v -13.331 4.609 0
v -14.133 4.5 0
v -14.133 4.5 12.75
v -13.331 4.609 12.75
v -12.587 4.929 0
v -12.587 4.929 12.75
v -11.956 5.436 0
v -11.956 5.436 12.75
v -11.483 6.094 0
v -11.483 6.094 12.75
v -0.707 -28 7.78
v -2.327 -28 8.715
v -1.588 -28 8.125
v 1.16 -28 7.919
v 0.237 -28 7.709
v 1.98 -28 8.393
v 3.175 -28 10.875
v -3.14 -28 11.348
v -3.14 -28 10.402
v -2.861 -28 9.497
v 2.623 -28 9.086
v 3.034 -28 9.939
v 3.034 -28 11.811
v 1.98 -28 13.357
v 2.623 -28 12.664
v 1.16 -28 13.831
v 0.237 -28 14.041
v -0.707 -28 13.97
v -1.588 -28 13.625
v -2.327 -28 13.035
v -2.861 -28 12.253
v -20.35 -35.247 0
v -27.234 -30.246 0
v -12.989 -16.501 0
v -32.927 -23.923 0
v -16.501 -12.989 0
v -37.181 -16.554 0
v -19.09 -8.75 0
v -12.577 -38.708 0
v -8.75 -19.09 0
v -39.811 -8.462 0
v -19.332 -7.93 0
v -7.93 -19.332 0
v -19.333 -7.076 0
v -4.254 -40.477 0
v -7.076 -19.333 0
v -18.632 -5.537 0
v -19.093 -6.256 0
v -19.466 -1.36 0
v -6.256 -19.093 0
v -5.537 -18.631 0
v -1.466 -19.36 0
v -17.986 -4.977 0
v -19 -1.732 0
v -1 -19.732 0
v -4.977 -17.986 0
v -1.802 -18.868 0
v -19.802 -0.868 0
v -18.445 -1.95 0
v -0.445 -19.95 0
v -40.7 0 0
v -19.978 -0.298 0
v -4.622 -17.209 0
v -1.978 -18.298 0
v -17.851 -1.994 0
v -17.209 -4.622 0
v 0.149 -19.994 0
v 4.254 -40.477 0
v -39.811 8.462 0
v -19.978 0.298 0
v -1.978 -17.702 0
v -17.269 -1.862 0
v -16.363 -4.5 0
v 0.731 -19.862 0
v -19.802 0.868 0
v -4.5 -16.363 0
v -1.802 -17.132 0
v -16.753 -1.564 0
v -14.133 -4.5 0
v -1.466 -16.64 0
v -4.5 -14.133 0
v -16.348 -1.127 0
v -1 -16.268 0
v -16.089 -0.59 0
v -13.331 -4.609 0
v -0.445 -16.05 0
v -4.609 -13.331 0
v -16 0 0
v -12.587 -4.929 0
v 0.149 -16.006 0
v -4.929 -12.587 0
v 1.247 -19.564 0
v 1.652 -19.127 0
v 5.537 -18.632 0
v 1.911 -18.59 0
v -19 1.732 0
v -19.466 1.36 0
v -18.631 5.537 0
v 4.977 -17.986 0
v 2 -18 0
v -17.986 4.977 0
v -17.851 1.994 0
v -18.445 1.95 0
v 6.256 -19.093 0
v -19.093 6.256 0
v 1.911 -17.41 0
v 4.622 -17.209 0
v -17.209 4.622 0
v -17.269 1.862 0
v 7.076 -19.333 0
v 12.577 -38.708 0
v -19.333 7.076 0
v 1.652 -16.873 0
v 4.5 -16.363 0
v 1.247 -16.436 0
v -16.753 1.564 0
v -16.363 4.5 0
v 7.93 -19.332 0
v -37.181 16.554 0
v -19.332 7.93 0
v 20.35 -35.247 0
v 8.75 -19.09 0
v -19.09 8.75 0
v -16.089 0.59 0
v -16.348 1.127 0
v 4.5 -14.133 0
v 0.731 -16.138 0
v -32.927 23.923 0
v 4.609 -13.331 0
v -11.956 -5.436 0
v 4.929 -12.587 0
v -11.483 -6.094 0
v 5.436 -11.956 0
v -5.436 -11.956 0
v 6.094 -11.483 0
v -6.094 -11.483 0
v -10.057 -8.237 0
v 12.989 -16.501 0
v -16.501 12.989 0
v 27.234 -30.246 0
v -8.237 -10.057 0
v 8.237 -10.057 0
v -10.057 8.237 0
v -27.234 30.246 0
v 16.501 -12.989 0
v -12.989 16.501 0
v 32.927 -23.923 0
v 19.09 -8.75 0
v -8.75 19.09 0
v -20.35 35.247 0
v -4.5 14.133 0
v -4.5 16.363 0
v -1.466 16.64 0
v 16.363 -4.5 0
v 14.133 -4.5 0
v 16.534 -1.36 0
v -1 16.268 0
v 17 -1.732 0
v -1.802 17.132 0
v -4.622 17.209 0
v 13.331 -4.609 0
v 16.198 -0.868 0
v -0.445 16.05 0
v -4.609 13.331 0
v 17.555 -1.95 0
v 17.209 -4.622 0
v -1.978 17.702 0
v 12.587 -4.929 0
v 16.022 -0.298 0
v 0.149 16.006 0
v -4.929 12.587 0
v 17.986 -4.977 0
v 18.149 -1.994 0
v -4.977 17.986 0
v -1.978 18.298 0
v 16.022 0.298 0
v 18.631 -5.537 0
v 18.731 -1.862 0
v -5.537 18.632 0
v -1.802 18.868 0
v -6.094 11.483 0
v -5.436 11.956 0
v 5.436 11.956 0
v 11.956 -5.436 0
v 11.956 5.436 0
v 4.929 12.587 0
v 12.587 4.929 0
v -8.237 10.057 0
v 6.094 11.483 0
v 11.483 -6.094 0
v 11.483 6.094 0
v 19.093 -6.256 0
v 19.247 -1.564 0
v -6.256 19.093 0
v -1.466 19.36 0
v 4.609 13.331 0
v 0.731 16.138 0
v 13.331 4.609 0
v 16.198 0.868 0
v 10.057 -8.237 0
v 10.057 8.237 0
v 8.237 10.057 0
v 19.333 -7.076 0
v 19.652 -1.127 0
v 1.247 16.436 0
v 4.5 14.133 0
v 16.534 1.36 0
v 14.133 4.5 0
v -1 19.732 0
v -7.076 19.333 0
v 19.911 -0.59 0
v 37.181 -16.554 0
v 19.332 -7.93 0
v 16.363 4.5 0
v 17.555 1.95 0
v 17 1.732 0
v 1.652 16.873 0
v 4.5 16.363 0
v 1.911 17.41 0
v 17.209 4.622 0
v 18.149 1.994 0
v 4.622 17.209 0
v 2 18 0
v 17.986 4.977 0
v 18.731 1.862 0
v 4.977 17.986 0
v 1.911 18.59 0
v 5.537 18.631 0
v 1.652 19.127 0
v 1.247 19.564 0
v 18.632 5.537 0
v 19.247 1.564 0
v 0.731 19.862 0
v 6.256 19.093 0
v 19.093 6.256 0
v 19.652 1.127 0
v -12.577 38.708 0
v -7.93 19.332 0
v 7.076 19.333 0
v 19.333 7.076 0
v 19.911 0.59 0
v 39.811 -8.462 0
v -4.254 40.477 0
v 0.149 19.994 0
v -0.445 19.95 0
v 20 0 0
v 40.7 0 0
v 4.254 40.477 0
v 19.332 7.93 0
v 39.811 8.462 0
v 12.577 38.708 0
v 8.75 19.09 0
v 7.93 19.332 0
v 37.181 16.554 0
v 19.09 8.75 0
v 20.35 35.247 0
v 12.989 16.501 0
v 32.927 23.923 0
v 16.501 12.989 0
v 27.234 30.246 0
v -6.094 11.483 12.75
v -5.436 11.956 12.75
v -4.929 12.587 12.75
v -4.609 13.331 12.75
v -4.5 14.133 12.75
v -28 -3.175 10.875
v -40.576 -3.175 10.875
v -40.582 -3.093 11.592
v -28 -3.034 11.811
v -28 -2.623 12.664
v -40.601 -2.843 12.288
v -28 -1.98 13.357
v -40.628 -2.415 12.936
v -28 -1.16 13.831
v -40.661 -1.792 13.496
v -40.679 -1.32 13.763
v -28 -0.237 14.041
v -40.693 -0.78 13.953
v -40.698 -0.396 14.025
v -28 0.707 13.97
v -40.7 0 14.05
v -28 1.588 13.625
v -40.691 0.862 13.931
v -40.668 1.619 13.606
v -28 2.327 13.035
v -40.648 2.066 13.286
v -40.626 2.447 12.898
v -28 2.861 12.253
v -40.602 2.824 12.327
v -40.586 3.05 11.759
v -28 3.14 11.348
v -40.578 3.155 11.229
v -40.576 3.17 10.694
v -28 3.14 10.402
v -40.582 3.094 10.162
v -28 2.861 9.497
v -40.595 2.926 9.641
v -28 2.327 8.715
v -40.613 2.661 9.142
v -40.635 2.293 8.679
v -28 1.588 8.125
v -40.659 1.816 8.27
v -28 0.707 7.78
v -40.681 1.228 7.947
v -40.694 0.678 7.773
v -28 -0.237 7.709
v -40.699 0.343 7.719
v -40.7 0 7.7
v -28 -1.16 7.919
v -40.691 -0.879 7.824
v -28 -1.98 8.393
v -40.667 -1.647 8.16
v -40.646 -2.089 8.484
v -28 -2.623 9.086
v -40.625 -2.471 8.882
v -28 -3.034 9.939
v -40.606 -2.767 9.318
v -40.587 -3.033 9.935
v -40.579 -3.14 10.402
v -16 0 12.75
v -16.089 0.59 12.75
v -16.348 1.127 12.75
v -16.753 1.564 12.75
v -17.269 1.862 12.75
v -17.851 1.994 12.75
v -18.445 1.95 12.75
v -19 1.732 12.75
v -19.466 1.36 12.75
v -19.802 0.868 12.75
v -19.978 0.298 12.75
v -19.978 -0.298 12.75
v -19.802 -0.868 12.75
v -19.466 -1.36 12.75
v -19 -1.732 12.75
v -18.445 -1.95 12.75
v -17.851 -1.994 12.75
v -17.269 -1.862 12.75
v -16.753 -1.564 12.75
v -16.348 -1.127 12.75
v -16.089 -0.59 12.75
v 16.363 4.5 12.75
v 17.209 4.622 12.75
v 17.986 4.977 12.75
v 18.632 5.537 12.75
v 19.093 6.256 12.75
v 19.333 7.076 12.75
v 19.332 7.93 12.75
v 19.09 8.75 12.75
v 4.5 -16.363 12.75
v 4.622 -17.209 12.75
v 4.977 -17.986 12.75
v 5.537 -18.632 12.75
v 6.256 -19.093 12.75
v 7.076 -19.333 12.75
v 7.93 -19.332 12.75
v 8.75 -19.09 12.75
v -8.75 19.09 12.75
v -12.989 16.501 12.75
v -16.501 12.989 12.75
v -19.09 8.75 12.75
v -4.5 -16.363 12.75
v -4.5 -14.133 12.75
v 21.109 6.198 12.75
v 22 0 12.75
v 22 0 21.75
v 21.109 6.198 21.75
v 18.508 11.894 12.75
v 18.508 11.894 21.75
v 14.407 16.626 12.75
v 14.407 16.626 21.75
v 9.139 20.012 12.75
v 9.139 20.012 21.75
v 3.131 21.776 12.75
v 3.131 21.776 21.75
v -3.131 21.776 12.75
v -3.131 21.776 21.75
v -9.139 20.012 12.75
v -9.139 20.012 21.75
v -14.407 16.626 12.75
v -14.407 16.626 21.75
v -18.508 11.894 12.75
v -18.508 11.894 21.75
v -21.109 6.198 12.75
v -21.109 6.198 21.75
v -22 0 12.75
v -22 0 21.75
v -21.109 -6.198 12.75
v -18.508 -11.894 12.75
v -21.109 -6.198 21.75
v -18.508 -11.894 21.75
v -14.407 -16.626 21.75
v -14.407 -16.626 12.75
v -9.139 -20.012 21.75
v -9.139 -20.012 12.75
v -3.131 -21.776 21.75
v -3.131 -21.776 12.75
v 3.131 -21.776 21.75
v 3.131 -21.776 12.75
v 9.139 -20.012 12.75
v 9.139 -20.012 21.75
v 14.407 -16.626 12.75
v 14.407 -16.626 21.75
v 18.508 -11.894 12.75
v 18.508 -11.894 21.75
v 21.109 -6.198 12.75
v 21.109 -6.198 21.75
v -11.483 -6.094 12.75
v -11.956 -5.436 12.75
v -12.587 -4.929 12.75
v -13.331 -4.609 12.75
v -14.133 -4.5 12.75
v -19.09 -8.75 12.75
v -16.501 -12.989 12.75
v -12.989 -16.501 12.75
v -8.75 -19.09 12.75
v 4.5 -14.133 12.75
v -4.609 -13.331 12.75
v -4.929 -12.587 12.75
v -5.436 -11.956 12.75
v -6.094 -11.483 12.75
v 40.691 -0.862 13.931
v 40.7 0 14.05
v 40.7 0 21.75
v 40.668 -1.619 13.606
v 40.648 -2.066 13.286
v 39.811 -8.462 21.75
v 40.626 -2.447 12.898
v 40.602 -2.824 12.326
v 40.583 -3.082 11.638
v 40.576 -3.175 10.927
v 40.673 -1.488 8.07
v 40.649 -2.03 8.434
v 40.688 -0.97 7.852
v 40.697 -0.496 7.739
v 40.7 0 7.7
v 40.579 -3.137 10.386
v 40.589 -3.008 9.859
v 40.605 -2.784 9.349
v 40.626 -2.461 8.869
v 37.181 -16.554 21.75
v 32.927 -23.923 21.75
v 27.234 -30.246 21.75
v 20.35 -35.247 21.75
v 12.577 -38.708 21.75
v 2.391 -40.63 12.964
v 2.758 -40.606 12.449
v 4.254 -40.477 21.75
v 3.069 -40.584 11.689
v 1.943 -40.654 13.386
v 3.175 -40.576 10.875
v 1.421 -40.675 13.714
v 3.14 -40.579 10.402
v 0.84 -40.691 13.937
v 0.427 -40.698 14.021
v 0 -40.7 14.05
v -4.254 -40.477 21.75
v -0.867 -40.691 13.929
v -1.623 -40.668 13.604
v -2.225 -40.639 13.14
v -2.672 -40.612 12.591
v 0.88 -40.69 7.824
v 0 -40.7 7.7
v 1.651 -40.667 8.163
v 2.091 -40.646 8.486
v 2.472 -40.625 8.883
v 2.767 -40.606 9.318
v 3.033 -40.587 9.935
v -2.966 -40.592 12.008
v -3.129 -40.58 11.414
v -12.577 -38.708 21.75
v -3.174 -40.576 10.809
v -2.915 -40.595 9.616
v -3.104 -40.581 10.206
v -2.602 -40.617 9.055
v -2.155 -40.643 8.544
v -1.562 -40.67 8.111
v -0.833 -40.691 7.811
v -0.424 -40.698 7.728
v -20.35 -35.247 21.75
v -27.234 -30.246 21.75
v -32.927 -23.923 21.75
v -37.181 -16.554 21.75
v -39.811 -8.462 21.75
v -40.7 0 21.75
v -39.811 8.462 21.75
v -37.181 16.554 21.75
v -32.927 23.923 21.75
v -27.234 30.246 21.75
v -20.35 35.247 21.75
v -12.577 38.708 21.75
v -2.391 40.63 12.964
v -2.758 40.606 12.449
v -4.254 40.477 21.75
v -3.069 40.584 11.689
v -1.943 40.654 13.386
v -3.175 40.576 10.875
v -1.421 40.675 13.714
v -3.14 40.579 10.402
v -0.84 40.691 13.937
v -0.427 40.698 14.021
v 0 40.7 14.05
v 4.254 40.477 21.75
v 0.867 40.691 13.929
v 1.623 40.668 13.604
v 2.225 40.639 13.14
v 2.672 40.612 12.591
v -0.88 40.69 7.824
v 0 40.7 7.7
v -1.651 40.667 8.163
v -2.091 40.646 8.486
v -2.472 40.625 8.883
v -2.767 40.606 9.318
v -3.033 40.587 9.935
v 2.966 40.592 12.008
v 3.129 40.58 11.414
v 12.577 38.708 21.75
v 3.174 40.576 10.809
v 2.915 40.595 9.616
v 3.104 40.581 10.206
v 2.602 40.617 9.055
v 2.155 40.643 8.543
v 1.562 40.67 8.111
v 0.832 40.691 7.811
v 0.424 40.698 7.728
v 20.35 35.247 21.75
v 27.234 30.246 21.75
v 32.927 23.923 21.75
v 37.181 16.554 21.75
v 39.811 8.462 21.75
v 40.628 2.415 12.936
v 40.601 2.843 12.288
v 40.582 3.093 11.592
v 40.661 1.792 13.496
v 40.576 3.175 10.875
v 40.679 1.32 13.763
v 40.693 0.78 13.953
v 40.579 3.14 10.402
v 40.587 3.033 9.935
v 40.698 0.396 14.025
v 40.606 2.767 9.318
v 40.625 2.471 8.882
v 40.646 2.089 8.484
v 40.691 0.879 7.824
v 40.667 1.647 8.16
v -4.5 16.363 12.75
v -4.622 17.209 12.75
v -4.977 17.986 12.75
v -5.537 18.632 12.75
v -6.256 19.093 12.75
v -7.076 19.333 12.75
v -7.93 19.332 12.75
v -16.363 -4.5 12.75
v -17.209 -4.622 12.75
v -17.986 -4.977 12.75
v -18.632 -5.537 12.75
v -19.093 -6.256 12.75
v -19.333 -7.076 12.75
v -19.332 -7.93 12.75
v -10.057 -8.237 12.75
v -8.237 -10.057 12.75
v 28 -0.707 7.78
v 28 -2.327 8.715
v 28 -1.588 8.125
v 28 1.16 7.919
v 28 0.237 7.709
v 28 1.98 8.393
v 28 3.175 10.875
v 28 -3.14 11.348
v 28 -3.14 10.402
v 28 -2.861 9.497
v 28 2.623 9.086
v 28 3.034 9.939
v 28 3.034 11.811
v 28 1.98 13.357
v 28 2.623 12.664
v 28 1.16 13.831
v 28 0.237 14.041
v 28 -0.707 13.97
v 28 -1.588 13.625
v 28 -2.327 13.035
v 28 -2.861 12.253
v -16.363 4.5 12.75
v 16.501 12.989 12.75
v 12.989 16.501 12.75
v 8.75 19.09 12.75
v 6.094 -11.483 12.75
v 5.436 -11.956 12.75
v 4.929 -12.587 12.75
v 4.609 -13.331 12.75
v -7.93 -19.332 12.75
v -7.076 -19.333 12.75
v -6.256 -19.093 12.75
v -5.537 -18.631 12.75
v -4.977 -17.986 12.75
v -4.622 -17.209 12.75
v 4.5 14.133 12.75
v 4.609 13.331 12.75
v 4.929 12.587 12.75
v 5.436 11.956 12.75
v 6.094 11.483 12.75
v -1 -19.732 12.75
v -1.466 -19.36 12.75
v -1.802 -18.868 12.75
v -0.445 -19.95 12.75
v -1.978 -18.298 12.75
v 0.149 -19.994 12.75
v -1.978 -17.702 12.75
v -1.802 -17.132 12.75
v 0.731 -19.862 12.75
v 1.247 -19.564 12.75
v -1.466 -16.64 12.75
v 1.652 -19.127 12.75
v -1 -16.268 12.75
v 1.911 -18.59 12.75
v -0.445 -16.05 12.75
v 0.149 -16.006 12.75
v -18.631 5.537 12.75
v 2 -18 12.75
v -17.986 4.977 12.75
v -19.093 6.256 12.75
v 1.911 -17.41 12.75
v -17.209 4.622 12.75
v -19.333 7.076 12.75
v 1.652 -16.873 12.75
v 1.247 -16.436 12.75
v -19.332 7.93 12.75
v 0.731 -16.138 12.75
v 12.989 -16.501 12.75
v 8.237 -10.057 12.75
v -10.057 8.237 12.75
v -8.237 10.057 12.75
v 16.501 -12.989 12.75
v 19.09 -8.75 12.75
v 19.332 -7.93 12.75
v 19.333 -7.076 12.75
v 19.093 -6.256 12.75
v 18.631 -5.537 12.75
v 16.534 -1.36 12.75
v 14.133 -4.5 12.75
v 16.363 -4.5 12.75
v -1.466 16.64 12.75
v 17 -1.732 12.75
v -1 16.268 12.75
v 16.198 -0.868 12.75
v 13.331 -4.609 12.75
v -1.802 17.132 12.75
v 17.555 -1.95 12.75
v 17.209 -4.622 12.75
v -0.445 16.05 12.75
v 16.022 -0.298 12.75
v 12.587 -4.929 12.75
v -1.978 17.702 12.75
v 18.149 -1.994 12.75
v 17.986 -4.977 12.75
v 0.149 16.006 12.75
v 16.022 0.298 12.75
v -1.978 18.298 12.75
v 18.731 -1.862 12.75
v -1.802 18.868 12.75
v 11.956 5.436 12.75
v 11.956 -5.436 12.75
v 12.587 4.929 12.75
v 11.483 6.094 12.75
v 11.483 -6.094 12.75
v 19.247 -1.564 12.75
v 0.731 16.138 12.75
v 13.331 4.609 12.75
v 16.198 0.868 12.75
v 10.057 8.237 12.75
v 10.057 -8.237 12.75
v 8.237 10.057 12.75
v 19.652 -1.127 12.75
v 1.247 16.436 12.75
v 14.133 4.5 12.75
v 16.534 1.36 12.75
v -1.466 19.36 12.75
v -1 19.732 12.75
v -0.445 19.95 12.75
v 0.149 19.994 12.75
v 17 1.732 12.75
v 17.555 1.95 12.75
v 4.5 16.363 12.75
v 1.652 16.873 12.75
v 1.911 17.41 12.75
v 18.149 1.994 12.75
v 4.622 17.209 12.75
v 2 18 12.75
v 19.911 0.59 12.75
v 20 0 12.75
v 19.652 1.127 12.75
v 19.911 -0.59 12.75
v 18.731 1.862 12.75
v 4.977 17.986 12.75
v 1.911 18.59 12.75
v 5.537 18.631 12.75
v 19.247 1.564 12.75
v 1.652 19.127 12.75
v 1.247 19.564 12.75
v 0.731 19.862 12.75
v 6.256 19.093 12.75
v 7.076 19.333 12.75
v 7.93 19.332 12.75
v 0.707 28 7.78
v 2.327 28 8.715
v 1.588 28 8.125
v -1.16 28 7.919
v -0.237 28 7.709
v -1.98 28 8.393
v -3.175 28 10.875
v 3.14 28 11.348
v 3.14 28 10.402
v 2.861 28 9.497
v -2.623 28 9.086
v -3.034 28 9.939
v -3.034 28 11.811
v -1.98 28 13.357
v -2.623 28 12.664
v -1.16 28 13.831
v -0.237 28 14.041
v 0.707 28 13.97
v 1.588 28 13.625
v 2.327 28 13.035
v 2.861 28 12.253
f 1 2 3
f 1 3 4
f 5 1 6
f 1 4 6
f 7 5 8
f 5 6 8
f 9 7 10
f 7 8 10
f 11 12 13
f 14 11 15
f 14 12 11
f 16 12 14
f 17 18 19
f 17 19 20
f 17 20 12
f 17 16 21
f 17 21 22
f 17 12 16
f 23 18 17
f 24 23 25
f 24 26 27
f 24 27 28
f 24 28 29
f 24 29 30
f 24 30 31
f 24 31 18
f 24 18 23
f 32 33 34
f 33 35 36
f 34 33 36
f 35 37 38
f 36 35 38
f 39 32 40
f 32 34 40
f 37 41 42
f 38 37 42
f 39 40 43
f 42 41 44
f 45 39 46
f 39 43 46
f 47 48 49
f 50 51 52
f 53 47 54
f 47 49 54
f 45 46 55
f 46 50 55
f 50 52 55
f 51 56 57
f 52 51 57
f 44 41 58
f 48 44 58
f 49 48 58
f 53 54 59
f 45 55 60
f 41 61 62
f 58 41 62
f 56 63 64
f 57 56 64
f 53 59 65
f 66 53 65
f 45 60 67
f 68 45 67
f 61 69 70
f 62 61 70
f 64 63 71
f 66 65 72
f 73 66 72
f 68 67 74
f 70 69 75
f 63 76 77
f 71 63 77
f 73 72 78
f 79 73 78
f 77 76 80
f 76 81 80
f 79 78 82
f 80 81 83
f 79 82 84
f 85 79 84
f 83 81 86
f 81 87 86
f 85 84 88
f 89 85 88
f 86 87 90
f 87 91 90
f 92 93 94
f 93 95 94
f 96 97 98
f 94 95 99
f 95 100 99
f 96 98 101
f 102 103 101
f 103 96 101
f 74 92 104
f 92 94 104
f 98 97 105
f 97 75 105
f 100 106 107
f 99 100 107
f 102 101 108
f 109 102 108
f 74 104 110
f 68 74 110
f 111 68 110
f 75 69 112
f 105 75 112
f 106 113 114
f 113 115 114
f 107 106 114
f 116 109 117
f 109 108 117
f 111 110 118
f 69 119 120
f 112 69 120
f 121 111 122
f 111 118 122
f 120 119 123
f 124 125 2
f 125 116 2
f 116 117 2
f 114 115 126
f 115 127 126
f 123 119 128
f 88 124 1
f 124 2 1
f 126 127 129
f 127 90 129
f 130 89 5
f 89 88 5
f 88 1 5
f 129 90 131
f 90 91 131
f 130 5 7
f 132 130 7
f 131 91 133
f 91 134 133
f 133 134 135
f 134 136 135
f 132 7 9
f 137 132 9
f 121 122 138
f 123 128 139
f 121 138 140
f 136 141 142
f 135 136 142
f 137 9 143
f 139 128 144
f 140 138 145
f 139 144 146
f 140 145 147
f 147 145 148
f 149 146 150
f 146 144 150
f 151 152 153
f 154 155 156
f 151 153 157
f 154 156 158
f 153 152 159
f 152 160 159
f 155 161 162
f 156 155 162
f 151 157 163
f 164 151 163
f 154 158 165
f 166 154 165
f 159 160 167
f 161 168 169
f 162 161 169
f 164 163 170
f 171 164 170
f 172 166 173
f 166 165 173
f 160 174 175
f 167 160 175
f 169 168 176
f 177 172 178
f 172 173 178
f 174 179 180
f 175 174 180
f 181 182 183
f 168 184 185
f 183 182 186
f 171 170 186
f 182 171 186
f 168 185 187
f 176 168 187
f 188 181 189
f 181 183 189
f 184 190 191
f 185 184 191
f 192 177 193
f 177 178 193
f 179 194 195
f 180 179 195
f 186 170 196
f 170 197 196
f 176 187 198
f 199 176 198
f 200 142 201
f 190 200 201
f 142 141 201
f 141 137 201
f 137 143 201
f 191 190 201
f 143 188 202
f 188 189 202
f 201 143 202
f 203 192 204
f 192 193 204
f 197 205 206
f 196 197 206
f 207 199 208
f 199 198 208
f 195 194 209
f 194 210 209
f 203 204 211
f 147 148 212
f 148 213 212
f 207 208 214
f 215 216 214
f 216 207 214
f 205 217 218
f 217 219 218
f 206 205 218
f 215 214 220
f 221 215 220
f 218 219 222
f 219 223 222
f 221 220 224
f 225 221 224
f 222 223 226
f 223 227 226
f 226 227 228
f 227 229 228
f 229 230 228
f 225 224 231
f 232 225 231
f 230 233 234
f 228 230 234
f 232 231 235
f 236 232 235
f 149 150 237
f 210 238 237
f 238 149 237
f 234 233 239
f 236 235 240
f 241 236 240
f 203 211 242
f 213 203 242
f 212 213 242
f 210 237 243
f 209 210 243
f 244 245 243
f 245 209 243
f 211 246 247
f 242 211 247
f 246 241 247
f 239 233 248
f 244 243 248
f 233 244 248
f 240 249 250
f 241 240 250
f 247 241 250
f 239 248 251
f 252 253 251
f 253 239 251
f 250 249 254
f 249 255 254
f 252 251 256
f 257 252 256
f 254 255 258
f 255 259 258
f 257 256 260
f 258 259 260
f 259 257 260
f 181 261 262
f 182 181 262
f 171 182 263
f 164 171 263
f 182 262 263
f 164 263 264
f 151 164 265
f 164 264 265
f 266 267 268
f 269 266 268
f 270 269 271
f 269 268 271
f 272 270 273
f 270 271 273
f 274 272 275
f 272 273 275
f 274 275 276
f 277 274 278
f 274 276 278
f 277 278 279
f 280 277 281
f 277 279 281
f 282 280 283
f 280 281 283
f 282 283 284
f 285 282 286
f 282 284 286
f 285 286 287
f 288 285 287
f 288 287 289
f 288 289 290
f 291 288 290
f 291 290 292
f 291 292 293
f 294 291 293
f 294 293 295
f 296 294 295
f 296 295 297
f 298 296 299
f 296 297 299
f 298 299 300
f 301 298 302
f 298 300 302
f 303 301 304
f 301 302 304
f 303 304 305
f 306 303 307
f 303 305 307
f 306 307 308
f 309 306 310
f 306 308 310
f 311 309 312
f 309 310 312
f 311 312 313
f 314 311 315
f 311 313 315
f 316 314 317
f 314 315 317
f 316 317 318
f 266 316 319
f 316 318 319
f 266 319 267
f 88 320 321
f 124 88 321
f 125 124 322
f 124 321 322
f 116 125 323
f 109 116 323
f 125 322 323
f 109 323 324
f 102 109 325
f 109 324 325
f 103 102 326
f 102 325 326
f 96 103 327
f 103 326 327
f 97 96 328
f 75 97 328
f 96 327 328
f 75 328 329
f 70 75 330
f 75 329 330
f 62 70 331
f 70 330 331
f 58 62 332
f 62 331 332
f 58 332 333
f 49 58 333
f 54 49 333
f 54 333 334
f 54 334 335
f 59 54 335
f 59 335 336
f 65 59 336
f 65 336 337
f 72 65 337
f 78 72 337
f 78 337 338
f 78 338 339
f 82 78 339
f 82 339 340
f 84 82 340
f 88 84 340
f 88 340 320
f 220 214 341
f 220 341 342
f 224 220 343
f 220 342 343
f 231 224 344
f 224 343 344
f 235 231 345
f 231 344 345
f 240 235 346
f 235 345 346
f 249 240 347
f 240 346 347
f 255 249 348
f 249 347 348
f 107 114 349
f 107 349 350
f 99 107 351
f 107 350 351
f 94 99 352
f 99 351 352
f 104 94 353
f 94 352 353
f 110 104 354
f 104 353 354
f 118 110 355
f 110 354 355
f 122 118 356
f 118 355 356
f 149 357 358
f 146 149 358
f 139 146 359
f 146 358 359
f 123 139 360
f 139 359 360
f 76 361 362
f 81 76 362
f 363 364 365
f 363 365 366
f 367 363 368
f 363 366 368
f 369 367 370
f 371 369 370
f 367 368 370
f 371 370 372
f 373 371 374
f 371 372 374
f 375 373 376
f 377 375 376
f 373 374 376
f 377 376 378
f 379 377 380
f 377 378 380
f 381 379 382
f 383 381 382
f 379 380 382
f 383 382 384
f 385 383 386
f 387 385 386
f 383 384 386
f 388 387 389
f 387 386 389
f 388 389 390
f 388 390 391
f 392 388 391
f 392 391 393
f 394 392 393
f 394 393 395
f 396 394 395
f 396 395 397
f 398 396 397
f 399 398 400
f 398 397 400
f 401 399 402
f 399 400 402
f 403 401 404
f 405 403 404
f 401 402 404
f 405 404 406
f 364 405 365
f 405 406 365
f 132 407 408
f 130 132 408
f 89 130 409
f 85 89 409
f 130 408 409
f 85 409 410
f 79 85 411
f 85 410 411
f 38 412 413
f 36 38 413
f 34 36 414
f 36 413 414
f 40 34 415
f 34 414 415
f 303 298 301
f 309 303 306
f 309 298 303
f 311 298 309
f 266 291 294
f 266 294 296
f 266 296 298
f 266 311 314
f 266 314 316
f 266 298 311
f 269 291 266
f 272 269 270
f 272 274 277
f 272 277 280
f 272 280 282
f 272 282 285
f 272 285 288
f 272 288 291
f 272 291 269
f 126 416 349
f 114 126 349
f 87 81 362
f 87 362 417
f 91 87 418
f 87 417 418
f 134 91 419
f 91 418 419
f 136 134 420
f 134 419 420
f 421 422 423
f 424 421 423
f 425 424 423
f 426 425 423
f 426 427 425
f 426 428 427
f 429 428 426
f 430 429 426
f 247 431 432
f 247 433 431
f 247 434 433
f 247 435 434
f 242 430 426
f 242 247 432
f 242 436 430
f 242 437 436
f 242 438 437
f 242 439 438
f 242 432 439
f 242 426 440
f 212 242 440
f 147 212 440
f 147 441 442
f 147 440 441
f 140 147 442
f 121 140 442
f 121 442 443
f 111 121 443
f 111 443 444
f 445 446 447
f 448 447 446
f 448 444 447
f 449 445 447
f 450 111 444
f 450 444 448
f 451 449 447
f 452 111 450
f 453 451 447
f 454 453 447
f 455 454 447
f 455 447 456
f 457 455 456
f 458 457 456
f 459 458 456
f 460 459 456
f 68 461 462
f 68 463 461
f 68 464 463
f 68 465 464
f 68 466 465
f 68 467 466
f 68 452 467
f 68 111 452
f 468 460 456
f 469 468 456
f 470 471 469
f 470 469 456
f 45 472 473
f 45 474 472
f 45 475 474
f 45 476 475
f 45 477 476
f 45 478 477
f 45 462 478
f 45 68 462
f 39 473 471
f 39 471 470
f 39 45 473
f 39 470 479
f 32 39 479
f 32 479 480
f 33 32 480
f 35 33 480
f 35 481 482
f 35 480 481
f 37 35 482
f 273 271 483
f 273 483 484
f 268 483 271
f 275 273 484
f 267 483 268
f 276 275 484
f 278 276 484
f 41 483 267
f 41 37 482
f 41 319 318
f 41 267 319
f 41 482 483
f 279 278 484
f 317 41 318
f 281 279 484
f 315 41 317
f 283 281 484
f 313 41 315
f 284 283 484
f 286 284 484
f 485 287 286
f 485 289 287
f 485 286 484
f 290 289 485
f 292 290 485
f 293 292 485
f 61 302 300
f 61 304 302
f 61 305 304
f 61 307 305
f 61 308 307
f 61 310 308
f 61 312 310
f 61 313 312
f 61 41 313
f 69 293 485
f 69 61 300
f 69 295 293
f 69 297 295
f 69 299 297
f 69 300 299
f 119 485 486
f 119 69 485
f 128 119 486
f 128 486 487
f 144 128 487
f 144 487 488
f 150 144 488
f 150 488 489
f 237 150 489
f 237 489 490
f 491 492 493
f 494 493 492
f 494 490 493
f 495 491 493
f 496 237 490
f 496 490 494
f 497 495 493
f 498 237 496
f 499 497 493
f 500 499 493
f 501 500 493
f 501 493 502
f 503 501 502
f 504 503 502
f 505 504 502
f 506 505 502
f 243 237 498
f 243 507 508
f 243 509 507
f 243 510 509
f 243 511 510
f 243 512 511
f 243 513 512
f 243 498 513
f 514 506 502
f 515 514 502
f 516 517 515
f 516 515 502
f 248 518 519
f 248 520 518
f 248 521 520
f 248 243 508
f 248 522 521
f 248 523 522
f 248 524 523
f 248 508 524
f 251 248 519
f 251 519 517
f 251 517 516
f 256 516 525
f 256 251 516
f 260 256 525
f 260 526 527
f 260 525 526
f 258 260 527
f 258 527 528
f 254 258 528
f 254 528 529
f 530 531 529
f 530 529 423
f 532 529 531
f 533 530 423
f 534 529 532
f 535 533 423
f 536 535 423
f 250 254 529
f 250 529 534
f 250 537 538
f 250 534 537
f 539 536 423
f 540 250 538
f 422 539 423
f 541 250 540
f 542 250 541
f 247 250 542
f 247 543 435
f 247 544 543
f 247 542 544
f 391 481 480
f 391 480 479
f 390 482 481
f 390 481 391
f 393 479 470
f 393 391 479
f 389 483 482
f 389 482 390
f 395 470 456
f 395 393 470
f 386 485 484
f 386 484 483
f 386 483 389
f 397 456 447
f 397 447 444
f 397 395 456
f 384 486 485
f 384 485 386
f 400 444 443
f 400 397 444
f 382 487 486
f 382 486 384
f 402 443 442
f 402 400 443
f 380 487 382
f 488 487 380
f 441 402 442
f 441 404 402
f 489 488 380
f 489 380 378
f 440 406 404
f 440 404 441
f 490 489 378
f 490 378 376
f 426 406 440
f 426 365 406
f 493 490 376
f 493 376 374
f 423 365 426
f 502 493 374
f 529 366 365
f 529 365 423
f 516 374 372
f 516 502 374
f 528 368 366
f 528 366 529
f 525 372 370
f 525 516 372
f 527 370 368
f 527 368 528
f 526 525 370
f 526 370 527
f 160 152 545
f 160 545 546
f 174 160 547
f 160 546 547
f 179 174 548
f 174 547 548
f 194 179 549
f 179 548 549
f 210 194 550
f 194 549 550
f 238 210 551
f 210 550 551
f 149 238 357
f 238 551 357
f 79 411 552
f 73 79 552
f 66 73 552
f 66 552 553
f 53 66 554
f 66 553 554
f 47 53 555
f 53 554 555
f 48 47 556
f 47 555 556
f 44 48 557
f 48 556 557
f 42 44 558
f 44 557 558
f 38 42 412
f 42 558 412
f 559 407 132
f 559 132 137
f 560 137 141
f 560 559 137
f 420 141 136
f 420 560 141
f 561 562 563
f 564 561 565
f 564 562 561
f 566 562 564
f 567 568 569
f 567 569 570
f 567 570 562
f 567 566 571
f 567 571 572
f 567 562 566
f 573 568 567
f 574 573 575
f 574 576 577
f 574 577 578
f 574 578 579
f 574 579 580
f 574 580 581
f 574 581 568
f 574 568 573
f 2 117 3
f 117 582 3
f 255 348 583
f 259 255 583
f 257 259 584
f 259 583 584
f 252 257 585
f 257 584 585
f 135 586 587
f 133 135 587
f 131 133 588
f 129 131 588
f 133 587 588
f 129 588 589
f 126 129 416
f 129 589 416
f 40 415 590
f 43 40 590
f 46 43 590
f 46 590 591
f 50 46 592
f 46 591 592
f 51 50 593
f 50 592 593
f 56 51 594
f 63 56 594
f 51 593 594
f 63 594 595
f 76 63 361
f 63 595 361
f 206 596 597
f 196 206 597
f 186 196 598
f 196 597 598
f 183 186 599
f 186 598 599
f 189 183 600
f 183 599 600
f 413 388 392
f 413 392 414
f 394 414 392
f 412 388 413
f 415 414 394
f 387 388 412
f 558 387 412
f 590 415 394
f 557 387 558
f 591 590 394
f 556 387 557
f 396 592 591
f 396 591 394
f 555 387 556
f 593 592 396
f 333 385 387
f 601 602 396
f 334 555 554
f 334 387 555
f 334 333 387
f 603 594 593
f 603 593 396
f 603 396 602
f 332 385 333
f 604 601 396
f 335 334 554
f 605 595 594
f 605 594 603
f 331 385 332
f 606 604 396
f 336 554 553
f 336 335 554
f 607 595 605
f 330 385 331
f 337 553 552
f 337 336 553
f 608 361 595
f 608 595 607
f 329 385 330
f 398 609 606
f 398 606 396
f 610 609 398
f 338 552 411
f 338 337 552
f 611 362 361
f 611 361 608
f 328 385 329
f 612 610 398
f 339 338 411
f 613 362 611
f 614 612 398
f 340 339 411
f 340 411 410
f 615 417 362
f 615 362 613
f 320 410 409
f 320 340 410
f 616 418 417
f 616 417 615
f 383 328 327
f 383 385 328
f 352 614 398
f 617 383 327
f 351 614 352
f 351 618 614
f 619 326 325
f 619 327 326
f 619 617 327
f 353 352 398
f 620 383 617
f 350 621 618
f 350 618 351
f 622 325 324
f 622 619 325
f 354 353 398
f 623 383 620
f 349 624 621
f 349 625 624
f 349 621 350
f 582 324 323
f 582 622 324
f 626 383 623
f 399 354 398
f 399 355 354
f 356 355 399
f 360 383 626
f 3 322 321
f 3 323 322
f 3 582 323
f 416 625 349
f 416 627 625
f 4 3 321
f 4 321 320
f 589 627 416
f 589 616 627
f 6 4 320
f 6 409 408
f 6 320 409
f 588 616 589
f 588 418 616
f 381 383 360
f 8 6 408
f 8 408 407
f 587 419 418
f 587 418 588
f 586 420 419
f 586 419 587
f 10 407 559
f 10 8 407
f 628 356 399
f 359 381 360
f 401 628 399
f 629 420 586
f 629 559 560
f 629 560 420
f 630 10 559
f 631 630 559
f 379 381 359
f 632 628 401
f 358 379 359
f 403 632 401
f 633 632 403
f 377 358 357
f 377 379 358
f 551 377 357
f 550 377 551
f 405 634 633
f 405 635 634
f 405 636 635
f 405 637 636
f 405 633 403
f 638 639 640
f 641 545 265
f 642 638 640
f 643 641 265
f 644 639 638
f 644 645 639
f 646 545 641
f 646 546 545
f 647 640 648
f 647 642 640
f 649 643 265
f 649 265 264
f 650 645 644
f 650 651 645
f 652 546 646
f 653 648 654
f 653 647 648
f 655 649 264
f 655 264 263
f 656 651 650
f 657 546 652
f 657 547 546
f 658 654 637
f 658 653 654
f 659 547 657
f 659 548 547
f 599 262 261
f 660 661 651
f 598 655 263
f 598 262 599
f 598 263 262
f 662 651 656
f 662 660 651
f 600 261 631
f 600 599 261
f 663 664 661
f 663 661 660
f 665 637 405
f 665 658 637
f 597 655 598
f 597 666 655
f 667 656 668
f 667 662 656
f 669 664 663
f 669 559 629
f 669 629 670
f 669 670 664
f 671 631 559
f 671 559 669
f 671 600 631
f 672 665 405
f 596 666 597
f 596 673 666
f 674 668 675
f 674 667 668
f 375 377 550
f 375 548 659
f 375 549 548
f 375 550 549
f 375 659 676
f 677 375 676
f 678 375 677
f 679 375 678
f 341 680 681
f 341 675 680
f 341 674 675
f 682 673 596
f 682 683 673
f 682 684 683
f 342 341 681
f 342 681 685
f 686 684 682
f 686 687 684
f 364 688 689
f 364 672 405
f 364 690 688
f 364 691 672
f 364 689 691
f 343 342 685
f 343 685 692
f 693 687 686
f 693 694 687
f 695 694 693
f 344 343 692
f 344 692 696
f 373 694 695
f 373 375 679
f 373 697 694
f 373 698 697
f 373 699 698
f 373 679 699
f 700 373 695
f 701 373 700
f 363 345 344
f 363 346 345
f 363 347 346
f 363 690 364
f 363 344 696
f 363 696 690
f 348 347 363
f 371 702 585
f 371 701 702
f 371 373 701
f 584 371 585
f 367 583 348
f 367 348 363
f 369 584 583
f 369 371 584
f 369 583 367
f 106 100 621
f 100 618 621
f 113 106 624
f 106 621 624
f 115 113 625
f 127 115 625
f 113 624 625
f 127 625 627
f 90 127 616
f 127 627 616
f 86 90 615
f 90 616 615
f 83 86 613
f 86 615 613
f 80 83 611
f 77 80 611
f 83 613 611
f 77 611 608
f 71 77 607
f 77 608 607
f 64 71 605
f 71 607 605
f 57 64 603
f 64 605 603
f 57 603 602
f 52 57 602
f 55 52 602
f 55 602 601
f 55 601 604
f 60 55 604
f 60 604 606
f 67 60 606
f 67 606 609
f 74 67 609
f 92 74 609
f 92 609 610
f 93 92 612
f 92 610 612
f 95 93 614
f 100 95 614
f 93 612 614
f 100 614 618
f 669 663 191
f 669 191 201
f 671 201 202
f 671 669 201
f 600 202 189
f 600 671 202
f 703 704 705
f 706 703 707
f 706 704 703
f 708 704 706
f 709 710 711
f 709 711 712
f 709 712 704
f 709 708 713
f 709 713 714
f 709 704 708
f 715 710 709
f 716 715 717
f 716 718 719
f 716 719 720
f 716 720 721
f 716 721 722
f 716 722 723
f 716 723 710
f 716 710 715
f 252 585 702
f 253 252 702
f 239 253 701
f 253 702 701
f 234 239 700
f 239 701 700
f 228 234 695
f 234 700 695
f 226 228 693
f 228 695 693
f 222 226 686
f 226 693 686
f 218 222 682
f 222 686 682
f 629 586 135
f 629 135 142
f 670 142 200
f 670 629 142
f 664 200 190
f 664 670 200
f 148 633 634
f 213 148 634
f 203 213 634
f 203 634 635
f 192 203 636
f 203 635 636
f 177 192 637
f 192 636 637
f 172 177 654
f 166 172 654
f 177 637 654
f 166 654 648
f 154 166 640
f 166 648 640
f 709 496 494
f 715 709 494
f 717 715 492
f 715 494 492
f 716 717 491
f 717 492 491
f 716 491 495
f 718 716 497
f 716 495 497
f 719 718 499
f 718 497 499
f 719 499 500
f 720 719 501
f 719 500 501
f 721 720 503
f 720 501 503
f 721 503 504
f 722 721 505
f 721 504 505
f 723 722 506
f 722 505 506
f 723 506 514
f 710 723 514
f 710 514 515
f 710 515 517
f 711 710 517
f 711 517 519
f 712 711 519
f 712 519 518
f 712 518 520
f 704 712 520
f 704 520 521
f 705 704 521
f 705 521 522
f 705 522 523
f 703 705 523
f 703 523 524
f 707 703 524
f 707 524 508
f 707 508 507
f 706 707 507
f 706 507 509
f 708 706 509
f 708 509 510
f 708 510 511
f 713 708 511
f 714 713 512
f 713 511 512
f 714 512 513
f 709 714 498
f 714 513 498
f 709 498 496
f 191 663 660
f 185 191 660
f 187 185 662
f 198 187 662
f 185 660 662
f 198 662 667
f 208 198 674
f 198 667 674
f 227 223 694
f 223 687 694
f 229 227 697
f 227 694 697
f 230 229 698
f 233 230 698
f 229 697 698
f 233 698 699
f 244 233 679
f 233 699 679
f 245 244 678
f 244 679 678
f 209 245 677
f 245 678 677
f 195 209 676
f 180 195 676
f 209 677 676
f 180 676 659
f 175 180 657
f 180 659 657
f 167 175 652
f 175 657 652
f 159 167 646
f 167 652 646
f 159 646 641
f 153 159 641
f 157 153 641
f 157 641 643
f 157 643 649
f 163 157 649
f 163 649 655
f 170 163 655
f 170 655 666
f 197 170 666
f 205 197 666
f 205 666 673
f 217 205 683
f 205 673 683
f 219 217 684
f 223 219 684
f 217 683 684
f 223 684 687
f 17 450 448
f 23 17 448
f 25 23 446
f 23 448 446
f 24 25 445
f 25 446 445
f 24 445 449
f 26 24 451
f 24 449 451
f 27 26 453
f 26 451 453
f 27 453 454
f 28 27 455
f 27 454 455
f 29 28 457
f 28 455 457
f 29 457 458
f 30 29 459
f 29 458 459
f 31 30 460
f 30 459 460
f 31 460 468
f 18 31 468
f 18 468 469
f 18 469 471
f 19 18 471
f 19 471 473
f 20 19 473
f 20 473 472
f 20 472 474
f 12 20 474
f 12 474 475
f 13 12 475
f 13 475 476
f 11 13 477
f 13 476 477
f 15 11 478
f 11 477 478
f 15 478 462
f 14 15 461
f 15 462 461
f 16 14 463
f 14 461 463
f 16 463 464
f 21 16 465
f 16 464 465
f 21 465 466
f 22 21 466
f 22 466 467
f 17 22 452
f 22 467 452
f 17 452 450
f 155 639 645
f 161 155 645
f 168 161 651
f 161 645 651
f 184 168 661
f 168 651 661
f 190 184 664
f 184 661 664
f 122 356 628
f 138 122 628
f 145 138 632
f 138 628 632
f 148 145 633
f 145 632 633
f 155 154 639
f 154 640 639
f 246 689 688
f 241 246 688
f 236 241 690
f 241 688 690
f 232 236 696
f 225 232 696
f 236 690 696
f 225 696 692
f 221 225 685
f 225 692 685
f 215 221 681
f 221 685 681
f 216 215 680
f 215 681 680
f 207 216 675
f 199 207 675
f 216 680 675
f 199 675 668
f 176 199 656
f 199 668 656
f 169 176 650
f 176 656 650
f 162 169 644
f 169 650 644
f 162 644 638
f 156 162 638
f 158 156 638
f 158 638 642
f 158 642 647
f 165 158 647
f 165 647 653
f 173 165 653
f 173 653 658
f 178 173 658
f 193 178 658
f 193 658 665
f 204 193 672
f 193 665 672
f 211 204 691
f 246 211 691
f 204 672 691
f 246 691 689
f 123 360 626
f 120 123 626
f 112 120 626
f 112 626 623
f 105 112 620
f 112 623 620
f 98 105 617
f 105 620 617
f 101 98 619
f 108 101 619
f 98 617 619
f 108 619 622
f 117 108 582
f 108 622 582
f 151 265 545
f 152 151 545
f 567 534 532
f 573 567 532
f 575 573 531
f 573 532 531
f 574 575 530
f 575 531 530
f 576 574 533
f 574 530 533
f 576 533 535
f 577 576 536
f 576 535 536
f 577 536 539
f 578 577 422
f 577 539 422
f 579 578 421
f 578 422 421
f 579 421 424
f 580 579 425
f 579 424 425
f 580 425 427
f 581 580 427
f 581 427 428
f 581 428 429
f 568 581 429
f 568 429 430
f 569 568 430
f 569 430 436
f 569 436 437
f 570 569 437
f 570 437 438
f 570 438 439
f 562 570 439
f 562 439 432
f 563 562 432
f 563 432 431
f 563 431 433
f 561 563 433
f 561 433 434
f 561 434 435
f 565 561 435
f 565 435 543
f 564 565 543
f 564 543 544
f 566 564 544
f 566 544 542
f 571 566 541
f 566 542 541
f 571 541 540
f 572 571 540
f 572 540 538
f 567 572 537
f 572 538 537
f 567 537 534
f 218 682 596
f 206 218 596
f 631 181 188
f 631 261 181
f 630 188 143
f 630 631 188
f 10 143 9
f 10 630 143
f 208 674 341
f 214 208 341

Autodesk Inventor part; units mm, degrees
sketch "Sketch1" plane through (0, 0, 0) normal (0, 0, 1) x (1, 0, 0)
  circle A0 centre (0, 0) radius 40.7
  dimension "d0" = 81.4
extrude "Extrusion1" add sketch "Sketch1" along normal blind 21.75
sketch "Sketch2" plane through (0, 0, 21.75) normal (0, 0, 1) x (1, 0, 0)
  circle A0 centre (0, 0) radius 22
  dimension "d3" = 44
extrude "Extrusion2" cut sketch "Sketch2" against normal blind 9
sketch "Sketch3" plane through (0, 0, 12.75) normal (0, 0, 1) x (1, 0, 0)
  circle A0 centre (0, 18) radius 2
  circle A1 centre (-18, 0) radius 2
  circle A2 centre (0, -18) radius 2
  circle A3 centre (18, 0) radius 2
  point P0 (0, 0)
  dimension "d6" = 4
  dimension "d7" = 18
  dimension "d10" = 360
extrude "Extrusion3" cut sketch "Sketch3" against normal blind 12.75
sketch "Sketch4" plane through (0, 0, 12.75) normal (0, 0, 1) x (1, 0, 0)
  arc A0 (-4.5165, 17.448) -> (-8.8542, 19.2414) centre (-7.5165, 16.3345) ccw
  arc A1 (-8.8542, 19.2414) -> (-19.0977, 9.16) centre (0, 0) ccw
  arc A2 (-14.1333, 4.5) -> (-11.4833, 6.0938) centre (-14.1333, 7.5) ccw
  line L0 (-4.5, 14.1333) -> (-4.5, 16.3631)
  arc A3 (-4.5, 16.3631) -> (-8.75, 19.0902) centre (-7.5, 16.3631) ccw
  arc A4 (-6.0938, 11.4833) -> (-4.5, 14.1333) centre (-7.5, 14.1333) ccw
  arc A5 (-6.0938, 11.4833) -> (-11.4833, 6.0938) centre (0, 0) ccw
  arc A6 (-8.8542, 19.2414) -> (-19.2547, 8.8254) centre (0, 0) ccw
  arc A7 (-8.75, 19.0902) -> (-19.0902, 8.75) centre (0, 0) ccw
  arc A8 (-19.0902, 8.75) -> (-16.3631, 4.5) centre (-16.3631, 7.5) ccw
  line L1 (-16.3631, 4.5) -> (-14.1333, 4.5)
  arc A9 (-11.4833, -6.0938) -> (-14.1333, -4.5) centre (-14.1333, -7.5) ccw
  arc A10 (-4.5, -14.1333) -> (-6.0938, -11.4833) centre (-7.5, -14.1333) ccw
  arc A11 (-11.4833, -6.0938) -> (-6.0938, -11.4833) centre (0, 0) ccw
  line L2 (-14.1333, -4.5) -> (-16.3631, -4.5)
  line L3 (-4.5, -16.3631) -> (-4.5, -14.1333)
  arc A12 (-16.3631, -4.5) -> (-19.0902, -8.75) centre (-16.3631, -7.5) ccw
  arc A13 (-17.448, -4.5165) -> (-19.2414, -8.8542) centre (-16.3345, -7.5165) ccw
  arc A14 (-8.75, -19.0902) -> (-4.5, -16.3631) centre (-7.5, -16.3631) ccw
  arc A15 (-19.0902, -8.75) -> (-8.75, -19.0902) centre (0, 0) ccw
  arc A16 (-19.2414, -8.8542) -> (-9.16, -19.0977) centre (0, 0) ccw
  arc A17 (-19.2414, -8.8542) -> (-8.8254, -19.2547) centre (0, 0) ccw
  arc A18 (6.0938, -11.4833) -> (4.5, -14.1333) centre (7.5, -14.1333) ccw
  arc A19 (14.1333, -4.5) -> (11.4833, -6.0938) centre (14.1333, -7.5) ccw
  arc A20 (6.0938, -11.4833) -> (11.4833, -6.0938) centre (0, 0) ccw
  line L4 (4.5, -14.1333) -> (4.5, -16.3631)
  line L5 (16.3631, -4.5) -> (14.1333, -4.5)
  arc A21 (4.5, -16.3631) -> (8.75, -19.0902) centre (7.5, -16.3631) ccw
  arc A22 (4.5165, -17.448) -> (8.8542, -19.2414) centre (7.5165, -16.3345) ccw
  arc A23 (19.0902, -8.75) -> (16.3631, -4.5) centre (16.3631, -7.5) ccw
  arc A24 (8.75, -19.0902) -> (19.0902, -8.75) centre (0, 0) ccw
  arc A25 (8.8542, -19.2414) -> (19.0977, -9.16) centre (0, 0) ccw
  arc A26 (8.8542, -19.2414) -> (19.2547, -8.8254) centre (0, 0) ccw
  arc A27 (11.4833, 6.0938) -> (14.1333, 4.5) centre (14.1333, 7.5) ccw
  arc A28 (4.5, 14.1333) -> (6.0938, 11.4833) centre (7.5, 14.1333) ccw
  arc A29 (11.4833, 6.0938) -> (6.0938, 11.4833) centre (0, 0) ccw
  line L6 (14.1333, 4.5) -> (16.3631, 4.5)
  line L7 (4.5, 16.3631) -> (4.5, 14.1333)
  arc A30 (16.3631, 4.5) -> (19.0902, 8.75) centre (16.3631, 7.5) ccw
  arc A31 (17.448, 4.5165) -> (19.2414, 8.8542) centre (16.3345, 7.5165) ccw
  arc A32 (8.75, 19.0902) -> (4.5, 16.3631) centre (7.5, 16.3631) ccw
  arc A33 (19.0902, 8.75) -> (8.75, 19.0902) centre (0, 0) ccw
  arc A34 (19.2414, 8.8542) -> (9.16, 19.0977) centre (0, 0) ccw
  arc A35 (19.2414, 8.8542) -> (8.8254, 19.2547) centre (0, 0) ccw
  point P0 (41.0732, 32.7294)
  point P1 (-17.4931, 4.4714)
  point P2 (-16.3796, 7.4714)
  point P3 (-7.4714, -16.3796)
  point P4 (-4.4714, -17.4931)
  point P5 (16.3796, -7.4714)
  point P6 (17.4931, -4.4714)
  point P7 (7.4714, 16.3796)
  point P8 (4.4714, 17.4931)
  dimension "d16" = 360
extrude "Extrusion4" cut sketch "Sketch4" against normal blind 12.75
ref_plane "Work Plane1" through (40.7, 0, 0) normal (1, 0, 0) x (0, 1, 0)
sketch "Sketch6" plane through (40.7, 0, 0) normal (1, 0, 0) x (0, 1, 0)
  circle A0 centre (0, 10.875) radius 3.175
  point P0 (0, 0)
  dimension "d24" = 6.35
extrude "Extrusion5" cut sketch "Sketch6" against normal blind 12.7
pattern_circular "Circular Pattern1" count 4 over 360 about axis through (0, 0, -10) along (0, 0, 1) of "Extrusion5"
properties part number "MotorHousing"
